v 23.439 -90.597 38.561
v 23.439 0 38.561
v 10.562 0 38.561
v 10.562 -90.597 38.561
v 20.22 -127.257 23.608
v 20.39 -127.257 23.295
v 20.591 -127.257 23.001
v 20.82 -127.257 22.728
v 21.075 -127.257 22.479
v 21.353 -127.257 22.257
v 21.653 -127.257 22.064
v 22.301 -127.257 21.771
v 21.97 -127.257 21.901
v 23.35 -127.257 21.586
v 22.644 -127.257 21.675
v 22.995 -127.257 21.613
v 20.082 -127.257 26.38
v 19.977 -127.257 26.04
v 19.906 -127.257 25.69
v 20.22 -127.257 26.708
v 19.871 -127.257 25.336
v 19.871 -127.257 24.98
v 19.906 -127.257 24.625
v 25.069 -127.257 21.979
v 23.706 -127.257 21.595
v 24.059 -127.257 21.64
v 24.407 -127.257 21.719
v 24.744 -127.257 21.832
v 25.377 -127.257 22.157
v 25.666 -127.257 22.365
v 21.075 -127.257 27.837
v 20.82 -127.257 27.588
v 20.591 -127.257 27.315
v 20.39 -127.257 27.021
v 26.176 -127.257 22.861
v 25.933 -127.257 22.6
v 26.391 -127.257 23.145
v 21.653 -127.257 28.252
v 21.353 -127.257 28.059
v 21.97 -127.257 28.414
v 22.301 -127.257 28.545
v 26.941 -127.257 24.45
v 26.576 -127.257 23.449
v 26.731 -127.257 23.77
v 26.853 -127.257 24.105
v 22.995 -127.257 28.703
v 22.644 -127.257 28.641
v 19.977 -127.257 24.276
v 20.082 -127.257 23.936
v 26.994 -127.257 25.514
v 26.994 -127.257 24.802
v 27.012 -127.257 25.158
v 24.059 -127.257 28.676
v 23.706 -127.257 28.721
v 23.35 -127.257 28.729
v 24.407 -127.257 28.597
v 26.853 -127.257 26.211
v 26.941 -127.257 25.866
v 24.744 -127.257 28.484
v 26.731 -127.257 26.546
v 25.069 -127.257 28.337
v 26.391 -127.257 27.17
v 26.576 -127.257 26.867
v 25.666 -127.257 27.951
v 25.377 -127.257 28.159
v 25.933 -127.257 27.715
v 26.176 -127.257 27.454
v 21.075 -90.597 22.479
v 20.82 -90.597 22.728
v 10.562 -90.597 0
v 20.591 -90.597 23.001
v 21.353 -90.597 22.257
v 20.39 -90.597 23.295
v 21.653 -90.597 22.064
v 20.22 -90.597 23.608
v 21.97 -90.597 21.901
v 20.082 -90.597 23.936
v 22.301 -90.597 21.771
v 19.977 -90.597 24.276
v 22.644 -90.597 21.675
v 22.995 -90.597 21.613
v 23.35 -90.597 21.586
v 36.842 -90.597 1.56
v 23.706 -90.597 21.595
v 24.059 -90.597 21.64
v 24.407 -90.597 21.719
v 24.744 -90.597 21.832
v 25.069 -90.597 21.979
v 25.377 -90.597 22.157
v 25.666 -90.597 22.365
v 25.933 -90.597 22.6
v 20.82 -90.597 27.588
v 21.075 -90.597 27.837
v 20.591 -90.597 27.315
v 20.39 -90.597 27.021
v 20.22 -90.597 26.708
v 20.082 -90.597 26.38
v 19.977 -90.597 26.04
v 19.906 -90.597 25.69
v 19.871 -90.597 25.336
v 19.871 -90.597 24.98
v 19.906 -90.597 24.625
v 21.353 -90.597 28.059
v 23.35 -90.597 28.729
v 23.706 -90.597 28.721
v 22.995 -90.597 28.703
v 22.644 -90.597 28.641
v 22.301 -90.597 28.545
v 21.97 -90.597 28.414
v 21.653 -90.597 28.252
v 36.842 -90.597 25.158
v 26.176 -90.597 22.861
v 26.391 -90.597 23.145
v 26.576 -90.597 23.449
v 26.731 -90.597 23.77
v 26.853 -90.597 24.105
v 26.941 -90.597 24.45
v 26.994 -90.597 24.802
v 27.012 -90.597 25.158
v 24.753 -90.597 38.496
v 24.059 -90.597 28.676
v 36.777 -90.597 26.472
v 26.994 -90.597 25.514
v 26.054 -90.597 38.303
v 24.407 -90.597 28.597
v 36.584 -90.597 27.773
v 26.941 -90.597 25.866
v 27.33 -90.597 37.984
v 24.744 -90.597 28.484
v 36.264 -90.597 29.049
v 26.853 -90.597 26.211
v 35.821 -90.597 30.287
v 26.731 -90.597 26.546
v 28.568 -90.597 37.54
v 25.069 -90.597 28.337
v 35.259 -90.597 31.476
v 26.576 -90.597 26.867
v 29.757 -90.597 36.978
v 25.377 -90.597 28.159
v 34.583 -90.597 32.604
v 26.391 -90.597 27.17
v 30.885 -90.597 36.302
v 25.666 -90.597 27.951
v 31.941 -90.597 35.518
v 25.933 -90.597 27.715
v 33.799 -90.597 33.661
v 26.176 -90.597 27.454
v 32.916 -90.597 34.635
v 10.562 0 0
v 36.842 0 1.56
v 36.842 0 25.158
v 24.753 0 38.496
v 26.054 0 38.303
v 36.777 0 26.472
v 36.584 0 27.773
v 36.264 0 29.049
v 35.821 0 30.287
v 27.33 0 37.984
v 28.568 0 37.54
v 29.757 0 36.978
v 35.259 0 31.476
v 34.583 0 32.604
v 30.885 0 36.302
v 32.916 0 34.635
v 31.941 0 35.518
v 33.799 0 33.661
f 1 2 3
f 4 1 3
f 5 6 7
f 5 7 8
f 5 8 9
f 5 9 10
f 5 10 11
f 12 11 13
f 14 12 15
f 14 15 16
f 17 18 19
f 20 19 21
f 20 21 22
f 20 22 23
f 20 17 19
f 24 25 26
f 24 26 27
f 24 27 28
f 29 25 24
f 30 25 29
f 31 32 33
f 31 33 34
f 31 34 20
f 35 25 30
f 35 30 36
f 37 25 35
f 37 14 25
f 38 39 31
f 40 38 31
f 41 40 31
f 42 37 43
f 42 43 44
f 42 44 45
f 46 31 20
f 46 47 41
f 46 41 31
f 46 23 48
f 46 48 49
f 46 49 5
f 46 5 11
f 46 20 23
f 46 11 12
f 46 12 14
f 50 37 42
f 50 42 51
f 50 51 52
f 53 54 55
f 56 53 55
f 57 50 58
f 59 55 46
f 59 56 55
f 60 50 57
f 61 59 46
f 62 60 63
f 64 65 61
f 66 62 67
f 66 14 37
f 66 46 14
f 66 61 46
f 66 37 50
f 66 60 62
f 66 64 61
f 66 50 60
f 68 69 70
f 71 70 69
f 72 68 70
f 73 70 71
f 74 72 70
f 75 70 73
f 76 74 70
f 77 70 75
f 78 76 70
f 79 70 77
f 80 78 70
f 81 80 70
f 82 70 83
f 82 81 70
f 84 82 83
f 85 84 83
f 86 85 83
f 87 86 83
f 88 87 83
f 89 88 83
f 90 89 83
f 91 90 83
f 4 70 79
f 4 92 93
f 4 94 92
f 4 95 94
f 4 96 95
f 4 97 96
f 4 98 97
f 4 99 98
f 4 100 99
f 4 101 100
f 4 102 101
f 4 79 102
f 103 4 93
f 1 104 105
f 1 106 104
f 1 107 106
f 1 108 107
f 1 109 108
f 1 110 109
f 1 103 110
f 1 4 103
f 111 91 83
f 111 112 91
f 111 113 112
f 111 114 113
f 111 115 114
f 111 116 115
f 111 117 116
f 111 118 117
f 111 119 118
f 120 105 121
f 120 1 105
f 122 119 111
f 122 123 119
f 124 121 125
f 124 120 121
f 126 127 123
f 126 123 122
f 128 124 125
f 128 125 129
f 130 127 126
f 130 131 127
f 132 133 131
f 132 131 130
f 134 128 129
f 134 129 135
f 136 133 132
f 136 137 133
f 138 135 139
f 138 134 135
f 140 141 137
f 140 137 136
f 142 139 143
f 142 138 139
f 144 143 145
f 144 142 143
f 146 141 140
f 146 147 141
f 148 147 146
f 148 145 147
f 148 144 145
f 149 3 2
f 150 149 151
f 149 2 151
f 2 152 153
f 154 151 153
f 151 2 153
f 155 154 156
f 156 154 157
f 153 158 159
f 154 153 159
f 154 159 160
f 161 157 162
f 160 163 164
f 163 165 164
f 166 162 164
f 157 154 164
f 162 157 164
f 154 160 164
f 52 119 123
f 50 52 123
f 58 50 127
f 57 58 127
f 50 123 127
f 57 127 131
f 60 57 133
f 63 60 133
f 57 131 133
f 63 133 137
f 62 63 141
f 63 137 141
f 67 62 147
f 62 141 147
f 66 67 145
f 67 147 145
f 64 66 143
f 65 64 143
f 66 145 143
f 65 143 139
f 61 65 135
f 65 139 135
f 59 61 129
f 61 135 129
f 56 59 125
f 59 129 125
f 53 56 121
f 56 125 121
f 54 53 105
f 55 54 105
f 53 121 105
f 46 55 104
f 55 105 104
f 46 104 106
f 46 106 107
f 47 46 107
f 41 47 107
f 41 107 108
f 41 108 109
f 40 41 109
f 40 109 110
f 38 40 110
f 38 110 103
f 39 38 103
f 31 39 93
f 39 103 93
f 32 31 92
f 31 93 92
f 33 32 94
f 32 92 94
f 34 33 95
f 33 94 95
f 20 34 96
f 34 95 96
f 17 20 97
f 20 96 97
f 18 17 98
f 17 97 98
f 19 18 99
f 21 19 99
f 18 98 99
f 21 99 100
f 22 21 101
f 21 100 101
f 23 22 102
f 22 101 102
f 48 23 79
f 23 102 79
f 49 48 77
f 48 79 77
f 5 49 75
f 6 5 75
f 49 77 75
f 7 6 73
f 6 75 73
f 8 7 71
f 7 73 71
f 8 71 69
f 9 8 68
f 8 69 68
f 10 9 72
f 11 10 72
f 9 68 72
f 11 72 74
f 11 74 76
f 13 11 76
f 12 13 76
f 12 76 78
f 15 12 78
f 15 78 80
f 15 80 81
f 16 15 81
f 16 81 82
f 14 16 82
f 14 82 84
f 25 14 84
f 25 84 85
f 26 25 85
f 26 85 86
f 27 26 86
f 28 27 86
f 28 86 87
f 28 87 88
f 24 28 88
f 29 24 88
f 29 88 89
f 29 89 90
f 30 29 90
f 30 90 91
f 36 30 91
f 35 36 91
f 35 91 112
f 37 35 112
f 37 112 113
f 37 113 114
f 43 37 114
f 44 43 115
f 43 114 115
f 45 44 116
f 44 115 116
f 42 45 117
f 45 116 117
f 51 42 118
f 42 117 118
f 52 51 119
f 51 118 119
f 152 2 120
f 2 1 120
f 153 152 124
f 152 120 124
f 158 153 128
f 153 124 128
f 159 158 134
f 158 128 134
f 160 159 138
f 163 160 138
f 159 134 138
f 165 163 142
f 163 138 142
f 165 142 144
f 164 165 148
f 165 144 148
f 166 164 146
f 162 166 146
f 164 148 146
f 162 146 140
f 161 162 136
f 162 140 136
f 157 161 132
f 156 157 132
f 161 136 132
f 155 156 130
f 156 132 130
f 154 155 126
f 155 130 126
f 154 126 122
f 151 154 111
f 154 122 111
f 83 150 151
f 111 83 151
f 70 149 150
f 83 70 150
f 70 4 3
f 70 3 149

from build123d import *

# Parameters (mm, degrees)
F1_DEPTH = 90.5968919396
F2_R     = 13.402691555
F3_R     = 3.5726570055
F4_DEPTH = 36.660566926


with BuildPart() as f1:
    # F0 (on Front) → F1 (new body)
    with BuildSketch(Plane.XZ):
        Polygon((36.8415974081, 38.5606420045), (10.5619765818, 38.5606420045), (10.5619765818, 0), (36.8415974081, 1.5603324458), align=None)
    extrude(amount=F1_DEPTH)

    # F2
    f2_edges = [f1.edges().sort_by_distance(p)[0] for p in [
        (36.841597, -45.298446, 38.560642),
    ]]
    fillet(f2_edges, radius=F2_R)

    # F3 (on face) → F4 (join)
    with BuildSketch(Plane.XZ.offset(90.5968919396)):
        with Locations((23.4389058531, 25.1579504495)):
            Circle(F3_R)
    extrude(amount=F4_DEPTH)


solid = f1.part
